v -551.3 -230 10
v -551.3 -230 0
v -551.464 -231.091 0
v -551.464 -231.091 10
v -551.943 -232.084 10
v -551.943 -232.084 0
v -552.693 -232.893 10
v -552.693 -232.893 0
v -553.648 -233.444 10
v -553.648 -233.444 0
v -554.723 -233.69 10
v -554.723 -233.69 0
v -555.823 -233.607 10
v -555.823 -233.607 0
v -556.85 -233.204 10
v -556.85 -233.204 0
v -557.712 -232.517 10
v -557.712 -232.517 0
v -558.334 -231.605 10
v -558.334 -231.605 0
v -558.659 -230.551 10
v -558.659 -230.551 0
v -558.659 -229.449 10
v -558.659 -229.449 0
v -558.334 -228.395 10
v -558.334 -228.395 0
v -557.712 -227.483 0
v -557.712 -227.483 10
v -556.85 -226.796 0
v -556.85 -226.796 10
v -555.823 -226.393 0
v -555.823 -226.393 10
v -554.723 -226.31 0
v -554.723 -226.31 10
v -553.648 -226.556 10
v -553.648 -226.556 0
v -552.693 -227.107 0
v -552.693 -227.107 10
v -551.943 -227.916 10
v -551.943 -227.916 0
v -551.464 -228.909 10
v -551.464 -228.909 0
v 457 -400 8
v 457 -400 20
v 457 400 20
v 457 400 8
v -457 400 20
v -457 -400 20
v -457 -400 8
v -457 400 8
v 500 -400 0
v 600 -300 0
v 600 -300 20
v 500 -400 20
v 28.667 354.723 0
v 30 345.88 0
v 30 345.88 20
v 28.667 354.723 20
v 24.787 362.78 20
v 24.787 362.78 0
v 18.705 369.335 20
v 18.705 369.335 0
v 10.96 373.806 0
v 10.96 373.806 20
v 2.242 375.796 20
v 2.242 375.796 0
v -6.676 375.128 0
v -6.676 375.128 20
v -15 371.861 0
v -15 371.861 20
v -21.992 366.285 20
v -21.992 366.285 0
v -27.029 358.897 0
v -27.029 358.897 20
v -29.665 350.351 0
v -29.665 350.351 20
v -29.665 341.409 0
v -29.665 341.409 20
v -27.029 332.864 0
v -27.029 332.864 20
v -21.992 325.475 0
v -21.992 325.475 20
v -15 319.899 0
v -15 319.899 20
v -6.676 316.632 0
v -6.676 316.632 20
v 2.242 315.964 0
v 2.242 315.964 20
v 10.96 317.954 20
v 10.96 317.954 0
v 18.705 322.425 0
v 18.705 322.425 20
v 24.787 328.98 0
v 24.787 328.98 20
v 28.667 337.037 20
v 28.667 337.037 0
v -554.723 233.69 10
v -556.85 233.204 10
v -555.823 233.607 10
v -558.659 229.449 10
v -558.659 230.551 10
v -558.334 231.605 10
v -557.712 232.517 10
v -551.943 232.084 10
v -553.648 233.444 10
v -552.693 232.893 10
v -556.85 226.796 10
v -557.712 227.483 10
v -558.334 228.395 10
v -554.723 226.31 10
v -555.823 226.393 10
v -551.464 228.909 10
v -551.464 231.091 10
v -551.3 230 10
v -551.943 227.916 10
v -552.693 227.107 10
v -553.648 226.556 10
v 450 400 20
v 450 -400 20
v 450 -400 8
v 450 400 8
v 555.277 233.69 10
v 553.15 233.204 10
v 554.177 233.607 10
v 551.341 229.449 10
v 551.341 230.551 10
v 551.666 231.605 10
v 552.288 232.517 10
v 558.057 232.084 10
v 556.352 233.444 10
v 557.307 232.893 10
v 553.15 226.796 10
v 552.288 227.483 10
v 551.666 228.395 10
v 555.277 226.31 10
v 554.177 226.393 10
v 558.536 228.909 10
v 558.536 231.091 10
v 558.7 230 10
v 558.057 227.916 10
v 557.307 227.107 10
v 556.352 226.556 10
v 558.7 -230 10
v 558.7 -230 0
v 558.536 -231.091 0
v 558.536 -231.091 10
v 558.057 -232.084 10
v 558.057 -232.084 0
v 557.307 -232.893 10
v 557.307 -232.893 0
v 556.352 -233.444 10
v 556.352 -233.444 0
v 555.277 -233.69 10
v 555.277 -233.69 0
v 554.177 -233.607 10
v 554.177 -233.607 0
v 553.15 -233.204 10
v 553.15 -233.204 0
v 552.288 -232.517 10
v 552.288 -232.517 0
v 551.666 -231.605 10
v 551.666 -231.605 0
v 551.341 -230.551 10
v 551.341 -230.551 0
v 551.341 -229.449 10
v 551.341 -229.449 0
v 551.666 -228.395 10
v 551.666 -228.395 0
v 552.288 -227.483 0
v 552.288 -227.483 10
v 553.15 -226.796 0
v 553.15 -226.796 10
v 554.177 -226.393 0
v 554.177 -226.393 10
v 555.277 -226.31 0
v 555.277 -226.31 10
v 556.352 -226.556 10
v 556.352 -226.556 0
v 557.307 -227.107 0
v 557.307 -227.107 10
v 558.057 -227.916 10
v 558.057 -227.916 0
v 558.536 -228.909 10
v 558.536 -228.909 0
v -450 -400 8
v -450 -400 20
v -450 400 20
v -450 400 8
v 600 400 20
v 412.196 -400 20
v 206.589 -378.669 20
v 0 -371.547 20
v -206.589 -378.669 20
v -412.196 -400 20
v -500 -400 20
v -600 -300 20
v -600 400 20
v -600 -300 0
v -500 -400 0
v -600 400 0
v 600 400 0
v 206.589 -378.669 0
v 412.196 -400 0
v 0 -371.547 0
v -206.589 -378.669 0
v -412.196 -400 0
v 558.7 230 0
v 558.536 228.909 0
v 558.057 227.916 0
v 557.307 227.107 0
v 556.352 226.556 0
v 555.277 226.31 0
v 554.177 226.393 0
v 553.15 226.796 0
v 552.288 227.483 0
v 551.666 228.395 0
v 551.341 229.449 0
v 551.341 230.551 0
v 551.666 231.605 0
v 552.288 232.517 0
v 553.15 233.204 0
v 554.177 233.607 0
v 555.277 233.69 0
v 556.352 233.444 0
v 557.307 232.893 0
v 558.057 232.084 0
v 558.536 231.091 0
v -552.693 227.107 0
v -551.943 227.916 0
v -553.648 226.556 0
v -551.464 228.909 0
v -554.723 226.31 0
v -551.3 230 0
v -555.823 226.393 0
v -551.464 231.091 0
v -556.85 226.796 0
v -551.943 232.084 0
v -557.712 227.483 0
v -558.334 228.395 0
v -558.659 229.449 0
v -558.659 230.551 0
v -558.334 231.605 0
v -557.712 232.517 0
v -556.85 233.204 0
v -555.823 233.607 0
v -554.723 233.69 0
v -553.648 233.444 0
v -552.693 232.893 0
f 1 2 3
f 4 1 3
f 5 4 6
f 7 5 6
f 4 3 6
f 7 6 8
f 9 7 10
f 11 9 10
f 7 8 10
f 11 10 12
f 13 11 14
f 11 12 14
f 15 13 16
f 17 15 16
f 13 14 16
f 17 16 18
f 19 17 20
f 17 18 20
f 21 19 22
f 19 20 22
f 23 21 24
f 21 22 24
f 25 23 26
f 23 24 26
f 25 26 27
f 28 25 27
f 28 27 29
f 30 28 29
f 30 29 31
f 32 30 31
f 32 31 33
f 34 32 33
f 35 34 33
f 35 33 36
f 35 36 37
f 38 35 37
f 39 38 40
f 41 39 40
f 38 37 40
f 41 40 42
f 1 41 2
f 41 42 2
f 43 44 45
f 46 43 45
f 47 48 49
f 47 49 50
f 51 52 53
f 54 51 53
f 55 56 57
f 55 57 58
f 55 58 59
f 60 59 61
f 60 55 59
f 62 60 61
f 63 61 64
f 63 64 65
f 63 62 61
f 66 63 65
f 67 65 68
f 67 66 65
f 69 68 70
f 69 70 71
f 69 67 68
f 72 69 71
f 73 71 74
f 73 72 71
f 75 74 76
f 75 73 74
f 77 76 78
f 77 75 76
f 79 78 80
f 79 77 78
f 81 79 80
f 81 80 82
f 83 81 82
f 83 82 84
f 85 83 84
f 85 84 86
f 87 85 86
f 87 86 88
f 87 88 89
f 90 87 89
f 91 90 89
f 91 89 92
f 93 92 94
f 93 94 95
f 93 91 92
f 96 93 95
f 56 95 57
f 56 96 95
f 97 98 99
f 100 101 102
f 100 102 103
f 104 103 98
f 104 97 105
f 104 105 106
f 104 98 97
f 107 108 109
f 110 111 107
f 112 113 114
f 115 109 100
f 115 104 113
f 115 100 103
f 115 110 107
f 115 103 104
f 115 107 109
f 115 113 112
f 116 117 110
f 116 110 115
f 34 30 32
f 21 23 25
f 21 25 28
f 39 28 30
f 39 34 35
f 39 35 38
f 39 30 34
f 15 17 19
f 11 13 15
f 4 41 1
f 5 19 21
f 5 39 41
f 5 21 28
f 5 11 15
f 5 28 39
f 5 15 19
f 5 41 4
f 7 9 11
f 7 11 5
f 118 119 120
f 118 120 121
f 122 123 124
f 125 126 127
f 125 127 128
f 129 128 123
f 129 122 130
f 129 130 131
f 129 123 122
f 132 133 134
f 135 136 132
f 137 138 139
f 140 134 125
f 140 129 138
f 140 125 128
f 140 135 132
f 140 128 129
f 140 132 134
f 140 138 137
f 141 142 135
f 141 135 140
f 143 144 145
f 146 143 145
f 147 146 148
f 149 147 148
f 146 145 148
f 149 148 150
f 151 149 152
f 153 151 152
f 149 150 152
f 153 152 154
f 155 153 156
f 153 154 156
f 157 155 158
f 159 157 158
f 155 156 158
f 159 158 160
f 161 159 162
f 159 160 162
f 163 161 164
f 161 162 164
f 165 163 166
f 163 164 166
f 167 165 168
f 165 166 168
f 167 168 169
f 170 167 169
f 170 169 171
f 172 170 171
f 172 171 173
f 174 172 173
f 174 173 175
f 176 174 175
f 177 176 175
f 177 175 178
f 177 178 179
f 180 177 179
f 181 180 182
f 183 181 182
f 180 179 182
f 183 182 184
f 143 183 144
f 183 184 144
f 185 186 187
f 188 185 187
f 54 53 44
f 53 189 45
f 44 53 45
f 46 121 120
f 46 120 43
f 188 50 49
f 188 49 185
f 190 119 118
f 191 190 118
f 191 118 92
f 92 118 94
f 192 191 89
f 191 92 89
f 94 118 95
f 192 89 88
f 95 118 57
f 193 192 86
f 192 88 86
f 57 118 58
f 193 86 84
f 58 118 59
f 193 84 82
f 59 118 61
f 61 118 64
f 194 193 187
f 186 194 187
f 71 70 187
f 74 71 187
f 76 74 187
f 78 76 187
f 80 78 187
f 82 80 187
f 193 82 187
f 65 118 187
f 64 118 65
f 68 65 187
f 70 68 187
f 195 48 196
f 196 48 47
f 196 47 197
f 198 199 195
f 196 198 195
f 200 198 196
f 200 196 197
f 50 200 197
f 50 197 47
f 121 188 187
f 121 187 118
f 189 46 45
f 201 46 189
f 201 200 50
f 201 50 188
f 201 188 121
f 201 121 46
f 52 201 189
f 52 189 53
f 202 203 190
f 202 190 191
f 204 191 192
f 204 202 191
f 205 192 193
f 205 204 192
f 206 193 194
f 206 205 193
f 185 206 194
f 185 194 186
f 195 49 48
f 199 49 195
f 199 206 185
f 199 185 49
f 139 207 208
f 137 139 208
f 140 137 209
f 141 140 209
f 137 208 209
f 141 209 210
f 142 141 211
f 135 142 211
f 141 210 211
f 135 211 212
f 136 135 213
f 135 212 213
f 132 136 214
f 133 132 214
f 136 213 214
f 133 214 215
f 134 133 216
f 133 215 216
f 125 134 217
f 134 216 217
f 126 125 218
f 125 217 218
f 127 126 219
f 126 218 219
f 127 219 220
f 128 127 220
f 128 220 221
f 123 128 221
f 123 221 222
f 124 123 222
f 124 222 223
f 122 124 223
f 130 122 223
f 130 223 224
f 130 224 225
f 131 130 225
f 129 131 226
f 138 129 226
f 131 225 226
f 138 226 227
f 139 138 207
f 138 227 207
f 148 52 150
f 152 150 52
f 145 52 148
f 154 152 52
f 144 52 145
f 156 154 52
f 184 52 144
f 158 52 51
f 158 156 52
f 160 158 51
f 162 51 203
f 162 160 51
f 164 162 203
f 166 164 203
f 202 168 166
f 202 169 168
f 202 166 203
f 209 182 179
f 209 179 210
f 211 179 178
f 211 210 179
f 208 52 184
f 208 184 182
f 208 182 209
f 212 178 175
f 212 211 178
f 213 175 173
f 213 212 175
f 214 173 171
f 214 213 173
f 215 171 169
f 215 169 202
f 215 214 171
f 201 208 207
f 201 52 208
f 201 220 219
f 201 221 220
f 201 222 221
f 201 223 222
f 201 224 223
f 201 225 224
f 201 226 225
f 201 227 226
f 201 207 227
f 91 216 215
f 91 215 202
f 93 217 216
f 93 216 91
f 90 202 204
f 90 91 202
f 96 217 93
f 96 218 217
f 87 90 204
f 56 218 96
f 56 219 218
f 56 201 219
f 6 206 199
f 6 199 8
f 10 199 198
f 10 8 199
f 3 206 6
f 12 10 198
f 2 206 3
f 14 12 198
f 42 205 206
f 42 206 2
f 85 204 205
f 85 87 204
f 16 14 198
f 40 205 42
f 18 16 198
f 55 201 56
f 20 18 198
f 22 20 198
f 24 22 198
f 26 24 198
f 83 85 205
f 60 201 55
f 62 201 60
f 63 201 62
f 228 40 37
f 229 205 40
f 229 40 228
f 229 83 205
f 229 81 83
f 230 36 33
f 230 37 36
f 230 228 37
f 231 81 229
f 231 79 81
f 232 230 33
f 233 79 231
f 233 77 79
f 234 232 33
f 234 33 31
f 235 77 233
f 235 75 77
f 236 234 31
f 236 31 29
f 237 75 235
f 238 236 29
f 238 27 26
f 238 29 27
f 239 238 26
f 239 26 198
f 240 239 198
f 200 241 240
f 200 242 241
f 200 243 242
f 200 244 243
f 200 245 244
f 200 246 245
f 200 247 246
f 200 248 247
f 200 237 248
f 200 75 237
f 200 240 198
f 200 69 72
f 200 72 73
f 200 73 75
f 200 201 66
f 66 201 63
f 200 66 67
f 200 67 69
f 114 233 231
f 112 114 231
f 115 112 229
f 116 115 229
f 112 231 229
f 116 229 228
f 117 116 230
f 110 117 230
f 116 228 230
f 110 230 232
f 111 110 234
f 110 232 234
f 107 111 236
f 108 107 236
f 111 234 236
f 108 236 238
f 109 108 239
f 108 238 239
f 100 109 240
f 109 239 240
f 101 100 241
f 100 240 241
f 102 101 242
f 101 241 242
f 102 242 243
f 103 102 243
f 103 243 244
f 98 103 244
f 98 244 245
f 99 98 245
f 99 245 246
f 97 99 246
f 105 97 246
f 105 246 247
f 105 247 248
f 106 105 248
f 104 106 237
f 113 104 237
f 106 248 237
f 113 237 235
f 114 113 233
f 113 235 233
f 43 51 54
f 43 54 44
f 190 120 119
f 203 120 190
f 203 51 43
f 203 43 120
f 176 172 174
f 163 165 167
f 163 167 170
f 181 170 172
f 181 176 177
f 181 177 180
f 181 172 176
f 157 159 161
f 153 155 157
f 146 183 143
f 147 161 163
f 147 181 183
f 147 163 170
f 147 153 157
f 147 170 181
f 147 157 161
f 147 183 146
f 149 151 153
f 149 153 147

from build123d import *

# Parameters (mm, degrees)
SKETCH_R        = 30
PAD_DEPTH       = 20
SKETCH001_W     = 7
SKETCH001_H     = 942.511505
SKETCH001_H_2   = 1014.077607
POCKET_DEPTH    = 12
SKETCH002_R     = 3.7
POCKET001_DEPTH = 10
CHAMFER_SIZE    = 100


with BuildPart() as part:
    # Sketch → Pad (new body)
    with BuildSketch(Plane.XY):
        with BuildLine():
            Line((-600, 400), (600, 400))
            Line((600, 400), (600, -400))
            Line((600, -400), (412.1962, -400))
            ThreePointArc((412.1962, -400), (0, -371.547458), (-412.1962, -400))
            Line((-412.1962, -400), (-600, -400))
            Line((-600, -400), (-600, 400))
        make_face()
        with Locations((0, 345.880096)):
            Circle(SKETCH_R, mode=Mode.SUBTRACT)
    extrude(amount=PAD_DEPTH)

    # Sketch001 → Pocket (cut)
    with BuildSketch(Plane.XY.offset(20)):
        with Locations((-453.5, -23.519761)):
            Rectangle(SKETCH001_W, SKETCH001_H)
        with Locations((453.5, -39.674209)):
            Rectangle(SKETCH001_W, SKETCH001_H_2)
    extrude(amount=-POCKET_DEPTH, mode=Mode.SUBTRACT)

    # Sketch002 → Pocket001 (cut)
    with BuildSketch(Plane(origin=(0, 0, 0), x_dir=(1, 0, 0), z_dir=(0, 0, -1))):
        with Locations((-555, -230)):
            Circle(SKETCH002_R)
        with Locations((-555, 230)):
            Circle(SKETCH002_R)
        with Locations((555, 230)):
            Circle(SKETCH002_R)
        with Locations((555, -230)):
            Circle(SKETCH002_R)
    extrude(amount=-POCKET001_DEPTH, mode=Mode.SUBTRACT)

    # Chamfer
    chamfer_edges = [part.edges().sort_by_distance(p)[0] for p in [
        (-600, -400, 10),
        (600, -400, 10),
    ]]
    chamfer(chamfer_edges, length=CHAMFER_SIZE)


solid = part.part
